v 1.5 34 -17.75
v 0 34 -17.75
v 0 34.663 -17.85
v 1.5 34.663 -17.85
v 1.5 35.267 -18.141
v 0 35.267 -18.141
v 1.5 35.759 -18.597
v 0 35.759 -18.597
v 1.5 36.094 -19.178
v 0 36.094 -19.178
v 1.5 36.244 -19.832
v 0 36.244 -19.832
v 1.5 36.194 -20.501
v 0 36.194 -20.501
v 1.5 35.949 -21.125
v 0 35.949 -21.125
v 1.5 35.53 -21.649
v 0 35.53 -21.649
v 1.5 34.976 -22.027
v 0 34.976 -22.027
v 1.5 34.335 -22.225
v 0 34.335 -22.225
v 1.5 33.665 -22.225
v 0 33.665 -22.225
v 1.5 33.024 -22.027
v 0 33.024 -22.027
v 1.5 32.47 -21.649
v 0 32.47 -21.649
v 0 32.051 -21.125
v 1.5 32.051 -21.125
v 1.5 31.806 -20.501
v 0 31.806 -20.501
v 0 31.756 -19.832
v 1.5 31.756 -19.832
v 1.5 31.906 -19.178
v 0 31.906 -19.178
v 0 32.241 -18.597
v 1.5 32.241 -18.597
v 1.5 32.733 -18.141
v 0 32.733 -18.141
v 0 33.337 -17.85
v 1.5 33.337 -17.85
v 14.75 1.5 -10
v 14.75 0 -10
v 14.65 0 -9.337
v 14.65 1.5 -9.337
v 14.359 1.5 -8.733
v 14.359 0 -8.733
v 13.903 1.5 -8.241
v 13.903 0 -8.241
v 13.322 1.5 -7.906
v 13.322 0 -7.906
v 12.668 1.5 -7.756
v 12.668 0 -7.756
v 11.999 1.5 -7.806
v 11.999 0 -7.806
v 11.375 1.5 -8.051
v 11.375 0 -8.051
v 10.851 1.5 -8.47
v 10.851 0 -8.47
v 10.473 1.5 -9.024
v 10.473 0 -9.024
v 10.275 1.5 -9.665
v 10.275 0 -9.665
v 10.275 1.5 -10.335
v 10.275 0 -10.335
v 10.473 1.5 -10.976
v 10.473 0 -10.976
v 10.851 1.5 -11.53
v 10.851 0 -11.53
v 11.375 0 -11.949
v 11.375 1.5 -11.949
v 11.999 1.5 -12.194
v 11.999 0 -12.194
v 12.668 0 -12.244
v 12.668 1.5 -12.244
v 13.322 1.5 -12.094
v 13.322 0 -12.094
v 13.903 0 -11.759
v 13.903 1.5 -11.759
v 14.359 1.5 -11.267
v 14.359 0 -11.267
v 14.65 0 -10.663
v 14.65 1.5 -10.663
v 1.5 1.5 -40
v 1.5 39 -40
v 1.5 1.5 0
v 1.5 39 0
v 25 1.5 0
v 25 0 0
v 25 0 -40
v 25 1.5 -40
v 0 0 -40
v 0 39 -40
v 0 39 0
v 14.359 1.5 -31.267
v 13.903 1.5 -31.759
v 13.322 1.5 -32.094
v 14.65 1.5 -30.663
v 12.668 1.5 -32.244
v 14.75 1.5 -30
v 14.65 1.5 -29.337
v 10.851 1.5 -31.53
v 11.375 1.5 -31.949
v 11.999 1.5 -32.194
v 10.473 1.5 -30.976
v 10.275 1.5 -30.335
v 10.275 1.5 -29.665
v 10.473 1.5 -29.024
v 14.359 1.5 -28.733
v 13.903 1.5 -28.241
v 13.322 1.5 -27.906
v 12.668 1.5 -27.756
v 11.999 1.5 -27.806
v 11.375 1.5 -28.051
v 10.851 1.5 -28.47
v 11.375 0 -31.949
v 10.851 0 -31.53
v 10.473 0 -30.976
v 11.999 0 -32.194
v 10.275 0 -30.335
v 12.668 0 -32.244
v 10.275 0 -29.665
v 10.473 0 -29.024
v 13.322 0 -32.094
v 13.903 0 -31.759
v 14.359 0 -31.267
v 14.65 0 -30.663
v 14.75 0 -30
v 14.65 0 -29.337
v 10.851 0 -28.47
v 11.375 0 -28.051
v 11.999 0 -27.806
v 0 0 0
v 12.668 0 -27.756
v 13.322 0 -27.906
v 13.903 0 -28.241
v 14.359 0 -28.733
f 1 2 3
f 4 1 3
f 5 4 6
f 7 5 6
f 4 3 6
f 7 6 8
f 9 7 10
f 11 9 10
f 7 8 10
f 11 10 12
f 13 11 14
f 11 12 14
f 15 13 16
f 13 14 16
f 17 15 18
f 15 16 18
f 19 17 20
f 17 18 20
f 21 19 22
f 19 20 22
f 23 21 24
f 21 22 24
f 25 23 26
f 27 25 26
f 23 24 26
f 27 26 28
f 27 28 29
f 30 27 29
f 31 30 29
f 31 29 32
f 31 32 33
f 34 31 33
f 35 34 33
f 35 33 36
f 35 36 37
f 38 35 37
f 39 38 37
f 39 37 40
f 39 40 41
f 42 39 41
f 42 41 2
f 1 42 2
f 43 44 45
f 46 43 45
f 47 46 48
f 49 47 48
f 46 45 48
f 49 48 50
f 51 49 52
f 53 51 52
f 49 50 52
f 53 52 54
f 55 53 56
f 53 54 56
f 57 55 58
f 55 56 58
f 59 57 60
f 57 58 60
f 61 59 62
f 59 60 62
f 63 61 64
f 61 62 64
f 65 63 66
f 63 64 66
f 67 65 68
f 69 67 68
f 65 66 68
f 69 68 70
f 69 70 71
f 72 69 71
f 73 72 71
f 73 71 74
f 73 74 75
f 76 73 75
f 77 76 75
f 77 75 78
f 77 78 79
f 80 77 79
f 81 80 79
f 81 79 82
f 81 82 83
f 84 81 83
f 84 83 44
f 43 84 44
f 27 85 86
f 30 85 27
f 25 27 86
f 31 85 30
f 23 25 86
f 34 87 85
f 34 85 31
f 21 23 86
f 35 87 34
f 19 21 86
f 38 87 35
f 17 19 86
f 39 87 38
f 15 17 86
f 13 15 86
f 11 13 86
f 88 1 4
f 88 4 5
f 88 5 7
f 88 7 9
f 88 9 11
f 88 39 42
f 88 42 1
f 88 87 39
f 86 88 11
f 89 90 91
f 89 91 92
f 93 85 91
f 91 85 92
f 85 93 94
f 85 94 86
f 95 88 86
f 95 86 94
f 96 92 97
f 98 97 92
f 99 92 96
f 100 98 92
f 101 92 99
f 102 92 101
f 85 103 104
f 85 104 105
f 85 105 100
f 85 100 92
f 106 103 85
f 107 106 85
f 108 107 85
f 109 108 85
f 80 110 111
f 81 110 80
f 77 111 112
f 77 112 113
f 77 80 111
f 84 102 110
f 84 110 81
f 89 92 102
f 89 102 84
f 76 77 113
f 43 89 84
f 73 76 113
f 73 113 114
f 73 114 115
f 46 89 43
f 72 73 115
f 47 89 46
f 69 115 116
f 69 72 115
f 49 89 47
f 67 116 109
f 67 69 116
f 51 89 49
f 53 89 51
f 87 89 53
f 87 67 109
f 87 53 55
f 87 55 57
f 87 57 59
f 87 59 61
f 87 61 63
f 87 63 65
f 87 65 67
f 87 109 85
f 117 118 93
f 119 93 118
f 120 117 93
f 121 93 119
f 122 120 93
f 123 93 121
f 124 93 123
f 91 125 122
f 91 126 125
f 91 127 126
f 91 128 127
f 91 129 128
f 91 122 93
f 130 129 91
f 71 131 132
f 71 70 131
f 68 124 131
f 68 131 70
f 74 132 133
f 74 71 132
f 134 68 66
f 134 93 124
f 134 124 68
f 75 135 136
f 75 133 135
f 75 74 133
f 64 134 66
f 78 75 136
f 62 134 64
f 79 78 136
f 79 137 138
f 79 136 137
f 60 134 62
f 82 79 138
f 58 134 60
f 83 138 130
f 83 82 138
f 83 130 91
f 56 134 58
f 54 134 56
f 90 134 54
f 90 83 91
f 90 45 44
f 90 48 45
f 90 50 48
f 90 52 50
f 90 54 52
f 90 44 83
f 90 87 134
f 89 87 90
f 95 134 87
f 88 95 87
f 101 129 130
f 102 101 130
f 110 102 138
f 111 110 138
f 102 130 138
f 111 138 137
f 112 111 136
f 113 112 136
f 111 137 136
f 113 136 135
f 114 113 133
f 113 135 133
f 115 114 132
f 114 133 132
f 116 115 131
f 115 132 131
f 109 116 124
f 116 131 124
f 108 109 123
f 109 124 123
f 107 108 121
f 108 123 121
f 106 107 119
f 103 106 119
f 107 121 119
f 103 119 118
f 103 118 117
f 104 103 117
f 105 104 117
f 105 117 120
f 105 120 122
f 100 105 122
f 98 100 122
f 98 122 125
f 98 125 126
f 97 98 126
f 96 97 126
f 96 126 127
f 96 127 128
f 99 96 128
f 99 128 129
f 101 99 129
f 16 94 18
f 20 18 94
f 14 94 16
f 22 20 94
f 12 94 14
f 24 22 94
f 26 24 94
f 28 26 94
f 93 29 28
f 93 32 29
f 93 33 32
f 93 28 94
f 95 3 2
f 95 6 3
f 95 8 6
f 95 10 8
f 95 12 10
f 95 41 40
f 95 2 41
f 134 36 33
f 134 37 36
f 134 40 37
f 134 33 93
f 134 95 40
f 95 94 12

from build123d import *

# Parameters (mm, degrees)
EXTRU_MINCE1_DEPTH = 40
D_GAGEMENT_M41_D   = 4.5
D_GAGEMENT_M42_D   = 4.5


with BuildPart() as part:
    # Esquisse1 → Extru.-Mince1 (new body)
    with BuildSketch(Plane.XY):
        Polygon((0, 39), (0, 0), (25, 0), (25, 1.5), (1.5, 1.5), (1.5, 39), align=None)
    extrude(amount=-EXTRU_MINCE1_DEPTH)

    # Dégagement M41 (through all)
    with Locations(Plane(origin=(0, 1.5, 0), x_dir=(-1, 0, 0), z_dir=(0, 1, 0))):
        with Locations((-12.5, -10), (-12.5, -30)):
            Hole(D_GAGEMENT_M41_D / 2)

    # Dégagement M42 (through all)
    with Locations(Plane(origin=(1.5, 0, 0), x_dir=(0, 0, -1), z_dir=(1, 0, 0))):
        with Locations((20, 34)):
            Hole(D_GAGEMENT_M42_D / 2)


solid = part.part
